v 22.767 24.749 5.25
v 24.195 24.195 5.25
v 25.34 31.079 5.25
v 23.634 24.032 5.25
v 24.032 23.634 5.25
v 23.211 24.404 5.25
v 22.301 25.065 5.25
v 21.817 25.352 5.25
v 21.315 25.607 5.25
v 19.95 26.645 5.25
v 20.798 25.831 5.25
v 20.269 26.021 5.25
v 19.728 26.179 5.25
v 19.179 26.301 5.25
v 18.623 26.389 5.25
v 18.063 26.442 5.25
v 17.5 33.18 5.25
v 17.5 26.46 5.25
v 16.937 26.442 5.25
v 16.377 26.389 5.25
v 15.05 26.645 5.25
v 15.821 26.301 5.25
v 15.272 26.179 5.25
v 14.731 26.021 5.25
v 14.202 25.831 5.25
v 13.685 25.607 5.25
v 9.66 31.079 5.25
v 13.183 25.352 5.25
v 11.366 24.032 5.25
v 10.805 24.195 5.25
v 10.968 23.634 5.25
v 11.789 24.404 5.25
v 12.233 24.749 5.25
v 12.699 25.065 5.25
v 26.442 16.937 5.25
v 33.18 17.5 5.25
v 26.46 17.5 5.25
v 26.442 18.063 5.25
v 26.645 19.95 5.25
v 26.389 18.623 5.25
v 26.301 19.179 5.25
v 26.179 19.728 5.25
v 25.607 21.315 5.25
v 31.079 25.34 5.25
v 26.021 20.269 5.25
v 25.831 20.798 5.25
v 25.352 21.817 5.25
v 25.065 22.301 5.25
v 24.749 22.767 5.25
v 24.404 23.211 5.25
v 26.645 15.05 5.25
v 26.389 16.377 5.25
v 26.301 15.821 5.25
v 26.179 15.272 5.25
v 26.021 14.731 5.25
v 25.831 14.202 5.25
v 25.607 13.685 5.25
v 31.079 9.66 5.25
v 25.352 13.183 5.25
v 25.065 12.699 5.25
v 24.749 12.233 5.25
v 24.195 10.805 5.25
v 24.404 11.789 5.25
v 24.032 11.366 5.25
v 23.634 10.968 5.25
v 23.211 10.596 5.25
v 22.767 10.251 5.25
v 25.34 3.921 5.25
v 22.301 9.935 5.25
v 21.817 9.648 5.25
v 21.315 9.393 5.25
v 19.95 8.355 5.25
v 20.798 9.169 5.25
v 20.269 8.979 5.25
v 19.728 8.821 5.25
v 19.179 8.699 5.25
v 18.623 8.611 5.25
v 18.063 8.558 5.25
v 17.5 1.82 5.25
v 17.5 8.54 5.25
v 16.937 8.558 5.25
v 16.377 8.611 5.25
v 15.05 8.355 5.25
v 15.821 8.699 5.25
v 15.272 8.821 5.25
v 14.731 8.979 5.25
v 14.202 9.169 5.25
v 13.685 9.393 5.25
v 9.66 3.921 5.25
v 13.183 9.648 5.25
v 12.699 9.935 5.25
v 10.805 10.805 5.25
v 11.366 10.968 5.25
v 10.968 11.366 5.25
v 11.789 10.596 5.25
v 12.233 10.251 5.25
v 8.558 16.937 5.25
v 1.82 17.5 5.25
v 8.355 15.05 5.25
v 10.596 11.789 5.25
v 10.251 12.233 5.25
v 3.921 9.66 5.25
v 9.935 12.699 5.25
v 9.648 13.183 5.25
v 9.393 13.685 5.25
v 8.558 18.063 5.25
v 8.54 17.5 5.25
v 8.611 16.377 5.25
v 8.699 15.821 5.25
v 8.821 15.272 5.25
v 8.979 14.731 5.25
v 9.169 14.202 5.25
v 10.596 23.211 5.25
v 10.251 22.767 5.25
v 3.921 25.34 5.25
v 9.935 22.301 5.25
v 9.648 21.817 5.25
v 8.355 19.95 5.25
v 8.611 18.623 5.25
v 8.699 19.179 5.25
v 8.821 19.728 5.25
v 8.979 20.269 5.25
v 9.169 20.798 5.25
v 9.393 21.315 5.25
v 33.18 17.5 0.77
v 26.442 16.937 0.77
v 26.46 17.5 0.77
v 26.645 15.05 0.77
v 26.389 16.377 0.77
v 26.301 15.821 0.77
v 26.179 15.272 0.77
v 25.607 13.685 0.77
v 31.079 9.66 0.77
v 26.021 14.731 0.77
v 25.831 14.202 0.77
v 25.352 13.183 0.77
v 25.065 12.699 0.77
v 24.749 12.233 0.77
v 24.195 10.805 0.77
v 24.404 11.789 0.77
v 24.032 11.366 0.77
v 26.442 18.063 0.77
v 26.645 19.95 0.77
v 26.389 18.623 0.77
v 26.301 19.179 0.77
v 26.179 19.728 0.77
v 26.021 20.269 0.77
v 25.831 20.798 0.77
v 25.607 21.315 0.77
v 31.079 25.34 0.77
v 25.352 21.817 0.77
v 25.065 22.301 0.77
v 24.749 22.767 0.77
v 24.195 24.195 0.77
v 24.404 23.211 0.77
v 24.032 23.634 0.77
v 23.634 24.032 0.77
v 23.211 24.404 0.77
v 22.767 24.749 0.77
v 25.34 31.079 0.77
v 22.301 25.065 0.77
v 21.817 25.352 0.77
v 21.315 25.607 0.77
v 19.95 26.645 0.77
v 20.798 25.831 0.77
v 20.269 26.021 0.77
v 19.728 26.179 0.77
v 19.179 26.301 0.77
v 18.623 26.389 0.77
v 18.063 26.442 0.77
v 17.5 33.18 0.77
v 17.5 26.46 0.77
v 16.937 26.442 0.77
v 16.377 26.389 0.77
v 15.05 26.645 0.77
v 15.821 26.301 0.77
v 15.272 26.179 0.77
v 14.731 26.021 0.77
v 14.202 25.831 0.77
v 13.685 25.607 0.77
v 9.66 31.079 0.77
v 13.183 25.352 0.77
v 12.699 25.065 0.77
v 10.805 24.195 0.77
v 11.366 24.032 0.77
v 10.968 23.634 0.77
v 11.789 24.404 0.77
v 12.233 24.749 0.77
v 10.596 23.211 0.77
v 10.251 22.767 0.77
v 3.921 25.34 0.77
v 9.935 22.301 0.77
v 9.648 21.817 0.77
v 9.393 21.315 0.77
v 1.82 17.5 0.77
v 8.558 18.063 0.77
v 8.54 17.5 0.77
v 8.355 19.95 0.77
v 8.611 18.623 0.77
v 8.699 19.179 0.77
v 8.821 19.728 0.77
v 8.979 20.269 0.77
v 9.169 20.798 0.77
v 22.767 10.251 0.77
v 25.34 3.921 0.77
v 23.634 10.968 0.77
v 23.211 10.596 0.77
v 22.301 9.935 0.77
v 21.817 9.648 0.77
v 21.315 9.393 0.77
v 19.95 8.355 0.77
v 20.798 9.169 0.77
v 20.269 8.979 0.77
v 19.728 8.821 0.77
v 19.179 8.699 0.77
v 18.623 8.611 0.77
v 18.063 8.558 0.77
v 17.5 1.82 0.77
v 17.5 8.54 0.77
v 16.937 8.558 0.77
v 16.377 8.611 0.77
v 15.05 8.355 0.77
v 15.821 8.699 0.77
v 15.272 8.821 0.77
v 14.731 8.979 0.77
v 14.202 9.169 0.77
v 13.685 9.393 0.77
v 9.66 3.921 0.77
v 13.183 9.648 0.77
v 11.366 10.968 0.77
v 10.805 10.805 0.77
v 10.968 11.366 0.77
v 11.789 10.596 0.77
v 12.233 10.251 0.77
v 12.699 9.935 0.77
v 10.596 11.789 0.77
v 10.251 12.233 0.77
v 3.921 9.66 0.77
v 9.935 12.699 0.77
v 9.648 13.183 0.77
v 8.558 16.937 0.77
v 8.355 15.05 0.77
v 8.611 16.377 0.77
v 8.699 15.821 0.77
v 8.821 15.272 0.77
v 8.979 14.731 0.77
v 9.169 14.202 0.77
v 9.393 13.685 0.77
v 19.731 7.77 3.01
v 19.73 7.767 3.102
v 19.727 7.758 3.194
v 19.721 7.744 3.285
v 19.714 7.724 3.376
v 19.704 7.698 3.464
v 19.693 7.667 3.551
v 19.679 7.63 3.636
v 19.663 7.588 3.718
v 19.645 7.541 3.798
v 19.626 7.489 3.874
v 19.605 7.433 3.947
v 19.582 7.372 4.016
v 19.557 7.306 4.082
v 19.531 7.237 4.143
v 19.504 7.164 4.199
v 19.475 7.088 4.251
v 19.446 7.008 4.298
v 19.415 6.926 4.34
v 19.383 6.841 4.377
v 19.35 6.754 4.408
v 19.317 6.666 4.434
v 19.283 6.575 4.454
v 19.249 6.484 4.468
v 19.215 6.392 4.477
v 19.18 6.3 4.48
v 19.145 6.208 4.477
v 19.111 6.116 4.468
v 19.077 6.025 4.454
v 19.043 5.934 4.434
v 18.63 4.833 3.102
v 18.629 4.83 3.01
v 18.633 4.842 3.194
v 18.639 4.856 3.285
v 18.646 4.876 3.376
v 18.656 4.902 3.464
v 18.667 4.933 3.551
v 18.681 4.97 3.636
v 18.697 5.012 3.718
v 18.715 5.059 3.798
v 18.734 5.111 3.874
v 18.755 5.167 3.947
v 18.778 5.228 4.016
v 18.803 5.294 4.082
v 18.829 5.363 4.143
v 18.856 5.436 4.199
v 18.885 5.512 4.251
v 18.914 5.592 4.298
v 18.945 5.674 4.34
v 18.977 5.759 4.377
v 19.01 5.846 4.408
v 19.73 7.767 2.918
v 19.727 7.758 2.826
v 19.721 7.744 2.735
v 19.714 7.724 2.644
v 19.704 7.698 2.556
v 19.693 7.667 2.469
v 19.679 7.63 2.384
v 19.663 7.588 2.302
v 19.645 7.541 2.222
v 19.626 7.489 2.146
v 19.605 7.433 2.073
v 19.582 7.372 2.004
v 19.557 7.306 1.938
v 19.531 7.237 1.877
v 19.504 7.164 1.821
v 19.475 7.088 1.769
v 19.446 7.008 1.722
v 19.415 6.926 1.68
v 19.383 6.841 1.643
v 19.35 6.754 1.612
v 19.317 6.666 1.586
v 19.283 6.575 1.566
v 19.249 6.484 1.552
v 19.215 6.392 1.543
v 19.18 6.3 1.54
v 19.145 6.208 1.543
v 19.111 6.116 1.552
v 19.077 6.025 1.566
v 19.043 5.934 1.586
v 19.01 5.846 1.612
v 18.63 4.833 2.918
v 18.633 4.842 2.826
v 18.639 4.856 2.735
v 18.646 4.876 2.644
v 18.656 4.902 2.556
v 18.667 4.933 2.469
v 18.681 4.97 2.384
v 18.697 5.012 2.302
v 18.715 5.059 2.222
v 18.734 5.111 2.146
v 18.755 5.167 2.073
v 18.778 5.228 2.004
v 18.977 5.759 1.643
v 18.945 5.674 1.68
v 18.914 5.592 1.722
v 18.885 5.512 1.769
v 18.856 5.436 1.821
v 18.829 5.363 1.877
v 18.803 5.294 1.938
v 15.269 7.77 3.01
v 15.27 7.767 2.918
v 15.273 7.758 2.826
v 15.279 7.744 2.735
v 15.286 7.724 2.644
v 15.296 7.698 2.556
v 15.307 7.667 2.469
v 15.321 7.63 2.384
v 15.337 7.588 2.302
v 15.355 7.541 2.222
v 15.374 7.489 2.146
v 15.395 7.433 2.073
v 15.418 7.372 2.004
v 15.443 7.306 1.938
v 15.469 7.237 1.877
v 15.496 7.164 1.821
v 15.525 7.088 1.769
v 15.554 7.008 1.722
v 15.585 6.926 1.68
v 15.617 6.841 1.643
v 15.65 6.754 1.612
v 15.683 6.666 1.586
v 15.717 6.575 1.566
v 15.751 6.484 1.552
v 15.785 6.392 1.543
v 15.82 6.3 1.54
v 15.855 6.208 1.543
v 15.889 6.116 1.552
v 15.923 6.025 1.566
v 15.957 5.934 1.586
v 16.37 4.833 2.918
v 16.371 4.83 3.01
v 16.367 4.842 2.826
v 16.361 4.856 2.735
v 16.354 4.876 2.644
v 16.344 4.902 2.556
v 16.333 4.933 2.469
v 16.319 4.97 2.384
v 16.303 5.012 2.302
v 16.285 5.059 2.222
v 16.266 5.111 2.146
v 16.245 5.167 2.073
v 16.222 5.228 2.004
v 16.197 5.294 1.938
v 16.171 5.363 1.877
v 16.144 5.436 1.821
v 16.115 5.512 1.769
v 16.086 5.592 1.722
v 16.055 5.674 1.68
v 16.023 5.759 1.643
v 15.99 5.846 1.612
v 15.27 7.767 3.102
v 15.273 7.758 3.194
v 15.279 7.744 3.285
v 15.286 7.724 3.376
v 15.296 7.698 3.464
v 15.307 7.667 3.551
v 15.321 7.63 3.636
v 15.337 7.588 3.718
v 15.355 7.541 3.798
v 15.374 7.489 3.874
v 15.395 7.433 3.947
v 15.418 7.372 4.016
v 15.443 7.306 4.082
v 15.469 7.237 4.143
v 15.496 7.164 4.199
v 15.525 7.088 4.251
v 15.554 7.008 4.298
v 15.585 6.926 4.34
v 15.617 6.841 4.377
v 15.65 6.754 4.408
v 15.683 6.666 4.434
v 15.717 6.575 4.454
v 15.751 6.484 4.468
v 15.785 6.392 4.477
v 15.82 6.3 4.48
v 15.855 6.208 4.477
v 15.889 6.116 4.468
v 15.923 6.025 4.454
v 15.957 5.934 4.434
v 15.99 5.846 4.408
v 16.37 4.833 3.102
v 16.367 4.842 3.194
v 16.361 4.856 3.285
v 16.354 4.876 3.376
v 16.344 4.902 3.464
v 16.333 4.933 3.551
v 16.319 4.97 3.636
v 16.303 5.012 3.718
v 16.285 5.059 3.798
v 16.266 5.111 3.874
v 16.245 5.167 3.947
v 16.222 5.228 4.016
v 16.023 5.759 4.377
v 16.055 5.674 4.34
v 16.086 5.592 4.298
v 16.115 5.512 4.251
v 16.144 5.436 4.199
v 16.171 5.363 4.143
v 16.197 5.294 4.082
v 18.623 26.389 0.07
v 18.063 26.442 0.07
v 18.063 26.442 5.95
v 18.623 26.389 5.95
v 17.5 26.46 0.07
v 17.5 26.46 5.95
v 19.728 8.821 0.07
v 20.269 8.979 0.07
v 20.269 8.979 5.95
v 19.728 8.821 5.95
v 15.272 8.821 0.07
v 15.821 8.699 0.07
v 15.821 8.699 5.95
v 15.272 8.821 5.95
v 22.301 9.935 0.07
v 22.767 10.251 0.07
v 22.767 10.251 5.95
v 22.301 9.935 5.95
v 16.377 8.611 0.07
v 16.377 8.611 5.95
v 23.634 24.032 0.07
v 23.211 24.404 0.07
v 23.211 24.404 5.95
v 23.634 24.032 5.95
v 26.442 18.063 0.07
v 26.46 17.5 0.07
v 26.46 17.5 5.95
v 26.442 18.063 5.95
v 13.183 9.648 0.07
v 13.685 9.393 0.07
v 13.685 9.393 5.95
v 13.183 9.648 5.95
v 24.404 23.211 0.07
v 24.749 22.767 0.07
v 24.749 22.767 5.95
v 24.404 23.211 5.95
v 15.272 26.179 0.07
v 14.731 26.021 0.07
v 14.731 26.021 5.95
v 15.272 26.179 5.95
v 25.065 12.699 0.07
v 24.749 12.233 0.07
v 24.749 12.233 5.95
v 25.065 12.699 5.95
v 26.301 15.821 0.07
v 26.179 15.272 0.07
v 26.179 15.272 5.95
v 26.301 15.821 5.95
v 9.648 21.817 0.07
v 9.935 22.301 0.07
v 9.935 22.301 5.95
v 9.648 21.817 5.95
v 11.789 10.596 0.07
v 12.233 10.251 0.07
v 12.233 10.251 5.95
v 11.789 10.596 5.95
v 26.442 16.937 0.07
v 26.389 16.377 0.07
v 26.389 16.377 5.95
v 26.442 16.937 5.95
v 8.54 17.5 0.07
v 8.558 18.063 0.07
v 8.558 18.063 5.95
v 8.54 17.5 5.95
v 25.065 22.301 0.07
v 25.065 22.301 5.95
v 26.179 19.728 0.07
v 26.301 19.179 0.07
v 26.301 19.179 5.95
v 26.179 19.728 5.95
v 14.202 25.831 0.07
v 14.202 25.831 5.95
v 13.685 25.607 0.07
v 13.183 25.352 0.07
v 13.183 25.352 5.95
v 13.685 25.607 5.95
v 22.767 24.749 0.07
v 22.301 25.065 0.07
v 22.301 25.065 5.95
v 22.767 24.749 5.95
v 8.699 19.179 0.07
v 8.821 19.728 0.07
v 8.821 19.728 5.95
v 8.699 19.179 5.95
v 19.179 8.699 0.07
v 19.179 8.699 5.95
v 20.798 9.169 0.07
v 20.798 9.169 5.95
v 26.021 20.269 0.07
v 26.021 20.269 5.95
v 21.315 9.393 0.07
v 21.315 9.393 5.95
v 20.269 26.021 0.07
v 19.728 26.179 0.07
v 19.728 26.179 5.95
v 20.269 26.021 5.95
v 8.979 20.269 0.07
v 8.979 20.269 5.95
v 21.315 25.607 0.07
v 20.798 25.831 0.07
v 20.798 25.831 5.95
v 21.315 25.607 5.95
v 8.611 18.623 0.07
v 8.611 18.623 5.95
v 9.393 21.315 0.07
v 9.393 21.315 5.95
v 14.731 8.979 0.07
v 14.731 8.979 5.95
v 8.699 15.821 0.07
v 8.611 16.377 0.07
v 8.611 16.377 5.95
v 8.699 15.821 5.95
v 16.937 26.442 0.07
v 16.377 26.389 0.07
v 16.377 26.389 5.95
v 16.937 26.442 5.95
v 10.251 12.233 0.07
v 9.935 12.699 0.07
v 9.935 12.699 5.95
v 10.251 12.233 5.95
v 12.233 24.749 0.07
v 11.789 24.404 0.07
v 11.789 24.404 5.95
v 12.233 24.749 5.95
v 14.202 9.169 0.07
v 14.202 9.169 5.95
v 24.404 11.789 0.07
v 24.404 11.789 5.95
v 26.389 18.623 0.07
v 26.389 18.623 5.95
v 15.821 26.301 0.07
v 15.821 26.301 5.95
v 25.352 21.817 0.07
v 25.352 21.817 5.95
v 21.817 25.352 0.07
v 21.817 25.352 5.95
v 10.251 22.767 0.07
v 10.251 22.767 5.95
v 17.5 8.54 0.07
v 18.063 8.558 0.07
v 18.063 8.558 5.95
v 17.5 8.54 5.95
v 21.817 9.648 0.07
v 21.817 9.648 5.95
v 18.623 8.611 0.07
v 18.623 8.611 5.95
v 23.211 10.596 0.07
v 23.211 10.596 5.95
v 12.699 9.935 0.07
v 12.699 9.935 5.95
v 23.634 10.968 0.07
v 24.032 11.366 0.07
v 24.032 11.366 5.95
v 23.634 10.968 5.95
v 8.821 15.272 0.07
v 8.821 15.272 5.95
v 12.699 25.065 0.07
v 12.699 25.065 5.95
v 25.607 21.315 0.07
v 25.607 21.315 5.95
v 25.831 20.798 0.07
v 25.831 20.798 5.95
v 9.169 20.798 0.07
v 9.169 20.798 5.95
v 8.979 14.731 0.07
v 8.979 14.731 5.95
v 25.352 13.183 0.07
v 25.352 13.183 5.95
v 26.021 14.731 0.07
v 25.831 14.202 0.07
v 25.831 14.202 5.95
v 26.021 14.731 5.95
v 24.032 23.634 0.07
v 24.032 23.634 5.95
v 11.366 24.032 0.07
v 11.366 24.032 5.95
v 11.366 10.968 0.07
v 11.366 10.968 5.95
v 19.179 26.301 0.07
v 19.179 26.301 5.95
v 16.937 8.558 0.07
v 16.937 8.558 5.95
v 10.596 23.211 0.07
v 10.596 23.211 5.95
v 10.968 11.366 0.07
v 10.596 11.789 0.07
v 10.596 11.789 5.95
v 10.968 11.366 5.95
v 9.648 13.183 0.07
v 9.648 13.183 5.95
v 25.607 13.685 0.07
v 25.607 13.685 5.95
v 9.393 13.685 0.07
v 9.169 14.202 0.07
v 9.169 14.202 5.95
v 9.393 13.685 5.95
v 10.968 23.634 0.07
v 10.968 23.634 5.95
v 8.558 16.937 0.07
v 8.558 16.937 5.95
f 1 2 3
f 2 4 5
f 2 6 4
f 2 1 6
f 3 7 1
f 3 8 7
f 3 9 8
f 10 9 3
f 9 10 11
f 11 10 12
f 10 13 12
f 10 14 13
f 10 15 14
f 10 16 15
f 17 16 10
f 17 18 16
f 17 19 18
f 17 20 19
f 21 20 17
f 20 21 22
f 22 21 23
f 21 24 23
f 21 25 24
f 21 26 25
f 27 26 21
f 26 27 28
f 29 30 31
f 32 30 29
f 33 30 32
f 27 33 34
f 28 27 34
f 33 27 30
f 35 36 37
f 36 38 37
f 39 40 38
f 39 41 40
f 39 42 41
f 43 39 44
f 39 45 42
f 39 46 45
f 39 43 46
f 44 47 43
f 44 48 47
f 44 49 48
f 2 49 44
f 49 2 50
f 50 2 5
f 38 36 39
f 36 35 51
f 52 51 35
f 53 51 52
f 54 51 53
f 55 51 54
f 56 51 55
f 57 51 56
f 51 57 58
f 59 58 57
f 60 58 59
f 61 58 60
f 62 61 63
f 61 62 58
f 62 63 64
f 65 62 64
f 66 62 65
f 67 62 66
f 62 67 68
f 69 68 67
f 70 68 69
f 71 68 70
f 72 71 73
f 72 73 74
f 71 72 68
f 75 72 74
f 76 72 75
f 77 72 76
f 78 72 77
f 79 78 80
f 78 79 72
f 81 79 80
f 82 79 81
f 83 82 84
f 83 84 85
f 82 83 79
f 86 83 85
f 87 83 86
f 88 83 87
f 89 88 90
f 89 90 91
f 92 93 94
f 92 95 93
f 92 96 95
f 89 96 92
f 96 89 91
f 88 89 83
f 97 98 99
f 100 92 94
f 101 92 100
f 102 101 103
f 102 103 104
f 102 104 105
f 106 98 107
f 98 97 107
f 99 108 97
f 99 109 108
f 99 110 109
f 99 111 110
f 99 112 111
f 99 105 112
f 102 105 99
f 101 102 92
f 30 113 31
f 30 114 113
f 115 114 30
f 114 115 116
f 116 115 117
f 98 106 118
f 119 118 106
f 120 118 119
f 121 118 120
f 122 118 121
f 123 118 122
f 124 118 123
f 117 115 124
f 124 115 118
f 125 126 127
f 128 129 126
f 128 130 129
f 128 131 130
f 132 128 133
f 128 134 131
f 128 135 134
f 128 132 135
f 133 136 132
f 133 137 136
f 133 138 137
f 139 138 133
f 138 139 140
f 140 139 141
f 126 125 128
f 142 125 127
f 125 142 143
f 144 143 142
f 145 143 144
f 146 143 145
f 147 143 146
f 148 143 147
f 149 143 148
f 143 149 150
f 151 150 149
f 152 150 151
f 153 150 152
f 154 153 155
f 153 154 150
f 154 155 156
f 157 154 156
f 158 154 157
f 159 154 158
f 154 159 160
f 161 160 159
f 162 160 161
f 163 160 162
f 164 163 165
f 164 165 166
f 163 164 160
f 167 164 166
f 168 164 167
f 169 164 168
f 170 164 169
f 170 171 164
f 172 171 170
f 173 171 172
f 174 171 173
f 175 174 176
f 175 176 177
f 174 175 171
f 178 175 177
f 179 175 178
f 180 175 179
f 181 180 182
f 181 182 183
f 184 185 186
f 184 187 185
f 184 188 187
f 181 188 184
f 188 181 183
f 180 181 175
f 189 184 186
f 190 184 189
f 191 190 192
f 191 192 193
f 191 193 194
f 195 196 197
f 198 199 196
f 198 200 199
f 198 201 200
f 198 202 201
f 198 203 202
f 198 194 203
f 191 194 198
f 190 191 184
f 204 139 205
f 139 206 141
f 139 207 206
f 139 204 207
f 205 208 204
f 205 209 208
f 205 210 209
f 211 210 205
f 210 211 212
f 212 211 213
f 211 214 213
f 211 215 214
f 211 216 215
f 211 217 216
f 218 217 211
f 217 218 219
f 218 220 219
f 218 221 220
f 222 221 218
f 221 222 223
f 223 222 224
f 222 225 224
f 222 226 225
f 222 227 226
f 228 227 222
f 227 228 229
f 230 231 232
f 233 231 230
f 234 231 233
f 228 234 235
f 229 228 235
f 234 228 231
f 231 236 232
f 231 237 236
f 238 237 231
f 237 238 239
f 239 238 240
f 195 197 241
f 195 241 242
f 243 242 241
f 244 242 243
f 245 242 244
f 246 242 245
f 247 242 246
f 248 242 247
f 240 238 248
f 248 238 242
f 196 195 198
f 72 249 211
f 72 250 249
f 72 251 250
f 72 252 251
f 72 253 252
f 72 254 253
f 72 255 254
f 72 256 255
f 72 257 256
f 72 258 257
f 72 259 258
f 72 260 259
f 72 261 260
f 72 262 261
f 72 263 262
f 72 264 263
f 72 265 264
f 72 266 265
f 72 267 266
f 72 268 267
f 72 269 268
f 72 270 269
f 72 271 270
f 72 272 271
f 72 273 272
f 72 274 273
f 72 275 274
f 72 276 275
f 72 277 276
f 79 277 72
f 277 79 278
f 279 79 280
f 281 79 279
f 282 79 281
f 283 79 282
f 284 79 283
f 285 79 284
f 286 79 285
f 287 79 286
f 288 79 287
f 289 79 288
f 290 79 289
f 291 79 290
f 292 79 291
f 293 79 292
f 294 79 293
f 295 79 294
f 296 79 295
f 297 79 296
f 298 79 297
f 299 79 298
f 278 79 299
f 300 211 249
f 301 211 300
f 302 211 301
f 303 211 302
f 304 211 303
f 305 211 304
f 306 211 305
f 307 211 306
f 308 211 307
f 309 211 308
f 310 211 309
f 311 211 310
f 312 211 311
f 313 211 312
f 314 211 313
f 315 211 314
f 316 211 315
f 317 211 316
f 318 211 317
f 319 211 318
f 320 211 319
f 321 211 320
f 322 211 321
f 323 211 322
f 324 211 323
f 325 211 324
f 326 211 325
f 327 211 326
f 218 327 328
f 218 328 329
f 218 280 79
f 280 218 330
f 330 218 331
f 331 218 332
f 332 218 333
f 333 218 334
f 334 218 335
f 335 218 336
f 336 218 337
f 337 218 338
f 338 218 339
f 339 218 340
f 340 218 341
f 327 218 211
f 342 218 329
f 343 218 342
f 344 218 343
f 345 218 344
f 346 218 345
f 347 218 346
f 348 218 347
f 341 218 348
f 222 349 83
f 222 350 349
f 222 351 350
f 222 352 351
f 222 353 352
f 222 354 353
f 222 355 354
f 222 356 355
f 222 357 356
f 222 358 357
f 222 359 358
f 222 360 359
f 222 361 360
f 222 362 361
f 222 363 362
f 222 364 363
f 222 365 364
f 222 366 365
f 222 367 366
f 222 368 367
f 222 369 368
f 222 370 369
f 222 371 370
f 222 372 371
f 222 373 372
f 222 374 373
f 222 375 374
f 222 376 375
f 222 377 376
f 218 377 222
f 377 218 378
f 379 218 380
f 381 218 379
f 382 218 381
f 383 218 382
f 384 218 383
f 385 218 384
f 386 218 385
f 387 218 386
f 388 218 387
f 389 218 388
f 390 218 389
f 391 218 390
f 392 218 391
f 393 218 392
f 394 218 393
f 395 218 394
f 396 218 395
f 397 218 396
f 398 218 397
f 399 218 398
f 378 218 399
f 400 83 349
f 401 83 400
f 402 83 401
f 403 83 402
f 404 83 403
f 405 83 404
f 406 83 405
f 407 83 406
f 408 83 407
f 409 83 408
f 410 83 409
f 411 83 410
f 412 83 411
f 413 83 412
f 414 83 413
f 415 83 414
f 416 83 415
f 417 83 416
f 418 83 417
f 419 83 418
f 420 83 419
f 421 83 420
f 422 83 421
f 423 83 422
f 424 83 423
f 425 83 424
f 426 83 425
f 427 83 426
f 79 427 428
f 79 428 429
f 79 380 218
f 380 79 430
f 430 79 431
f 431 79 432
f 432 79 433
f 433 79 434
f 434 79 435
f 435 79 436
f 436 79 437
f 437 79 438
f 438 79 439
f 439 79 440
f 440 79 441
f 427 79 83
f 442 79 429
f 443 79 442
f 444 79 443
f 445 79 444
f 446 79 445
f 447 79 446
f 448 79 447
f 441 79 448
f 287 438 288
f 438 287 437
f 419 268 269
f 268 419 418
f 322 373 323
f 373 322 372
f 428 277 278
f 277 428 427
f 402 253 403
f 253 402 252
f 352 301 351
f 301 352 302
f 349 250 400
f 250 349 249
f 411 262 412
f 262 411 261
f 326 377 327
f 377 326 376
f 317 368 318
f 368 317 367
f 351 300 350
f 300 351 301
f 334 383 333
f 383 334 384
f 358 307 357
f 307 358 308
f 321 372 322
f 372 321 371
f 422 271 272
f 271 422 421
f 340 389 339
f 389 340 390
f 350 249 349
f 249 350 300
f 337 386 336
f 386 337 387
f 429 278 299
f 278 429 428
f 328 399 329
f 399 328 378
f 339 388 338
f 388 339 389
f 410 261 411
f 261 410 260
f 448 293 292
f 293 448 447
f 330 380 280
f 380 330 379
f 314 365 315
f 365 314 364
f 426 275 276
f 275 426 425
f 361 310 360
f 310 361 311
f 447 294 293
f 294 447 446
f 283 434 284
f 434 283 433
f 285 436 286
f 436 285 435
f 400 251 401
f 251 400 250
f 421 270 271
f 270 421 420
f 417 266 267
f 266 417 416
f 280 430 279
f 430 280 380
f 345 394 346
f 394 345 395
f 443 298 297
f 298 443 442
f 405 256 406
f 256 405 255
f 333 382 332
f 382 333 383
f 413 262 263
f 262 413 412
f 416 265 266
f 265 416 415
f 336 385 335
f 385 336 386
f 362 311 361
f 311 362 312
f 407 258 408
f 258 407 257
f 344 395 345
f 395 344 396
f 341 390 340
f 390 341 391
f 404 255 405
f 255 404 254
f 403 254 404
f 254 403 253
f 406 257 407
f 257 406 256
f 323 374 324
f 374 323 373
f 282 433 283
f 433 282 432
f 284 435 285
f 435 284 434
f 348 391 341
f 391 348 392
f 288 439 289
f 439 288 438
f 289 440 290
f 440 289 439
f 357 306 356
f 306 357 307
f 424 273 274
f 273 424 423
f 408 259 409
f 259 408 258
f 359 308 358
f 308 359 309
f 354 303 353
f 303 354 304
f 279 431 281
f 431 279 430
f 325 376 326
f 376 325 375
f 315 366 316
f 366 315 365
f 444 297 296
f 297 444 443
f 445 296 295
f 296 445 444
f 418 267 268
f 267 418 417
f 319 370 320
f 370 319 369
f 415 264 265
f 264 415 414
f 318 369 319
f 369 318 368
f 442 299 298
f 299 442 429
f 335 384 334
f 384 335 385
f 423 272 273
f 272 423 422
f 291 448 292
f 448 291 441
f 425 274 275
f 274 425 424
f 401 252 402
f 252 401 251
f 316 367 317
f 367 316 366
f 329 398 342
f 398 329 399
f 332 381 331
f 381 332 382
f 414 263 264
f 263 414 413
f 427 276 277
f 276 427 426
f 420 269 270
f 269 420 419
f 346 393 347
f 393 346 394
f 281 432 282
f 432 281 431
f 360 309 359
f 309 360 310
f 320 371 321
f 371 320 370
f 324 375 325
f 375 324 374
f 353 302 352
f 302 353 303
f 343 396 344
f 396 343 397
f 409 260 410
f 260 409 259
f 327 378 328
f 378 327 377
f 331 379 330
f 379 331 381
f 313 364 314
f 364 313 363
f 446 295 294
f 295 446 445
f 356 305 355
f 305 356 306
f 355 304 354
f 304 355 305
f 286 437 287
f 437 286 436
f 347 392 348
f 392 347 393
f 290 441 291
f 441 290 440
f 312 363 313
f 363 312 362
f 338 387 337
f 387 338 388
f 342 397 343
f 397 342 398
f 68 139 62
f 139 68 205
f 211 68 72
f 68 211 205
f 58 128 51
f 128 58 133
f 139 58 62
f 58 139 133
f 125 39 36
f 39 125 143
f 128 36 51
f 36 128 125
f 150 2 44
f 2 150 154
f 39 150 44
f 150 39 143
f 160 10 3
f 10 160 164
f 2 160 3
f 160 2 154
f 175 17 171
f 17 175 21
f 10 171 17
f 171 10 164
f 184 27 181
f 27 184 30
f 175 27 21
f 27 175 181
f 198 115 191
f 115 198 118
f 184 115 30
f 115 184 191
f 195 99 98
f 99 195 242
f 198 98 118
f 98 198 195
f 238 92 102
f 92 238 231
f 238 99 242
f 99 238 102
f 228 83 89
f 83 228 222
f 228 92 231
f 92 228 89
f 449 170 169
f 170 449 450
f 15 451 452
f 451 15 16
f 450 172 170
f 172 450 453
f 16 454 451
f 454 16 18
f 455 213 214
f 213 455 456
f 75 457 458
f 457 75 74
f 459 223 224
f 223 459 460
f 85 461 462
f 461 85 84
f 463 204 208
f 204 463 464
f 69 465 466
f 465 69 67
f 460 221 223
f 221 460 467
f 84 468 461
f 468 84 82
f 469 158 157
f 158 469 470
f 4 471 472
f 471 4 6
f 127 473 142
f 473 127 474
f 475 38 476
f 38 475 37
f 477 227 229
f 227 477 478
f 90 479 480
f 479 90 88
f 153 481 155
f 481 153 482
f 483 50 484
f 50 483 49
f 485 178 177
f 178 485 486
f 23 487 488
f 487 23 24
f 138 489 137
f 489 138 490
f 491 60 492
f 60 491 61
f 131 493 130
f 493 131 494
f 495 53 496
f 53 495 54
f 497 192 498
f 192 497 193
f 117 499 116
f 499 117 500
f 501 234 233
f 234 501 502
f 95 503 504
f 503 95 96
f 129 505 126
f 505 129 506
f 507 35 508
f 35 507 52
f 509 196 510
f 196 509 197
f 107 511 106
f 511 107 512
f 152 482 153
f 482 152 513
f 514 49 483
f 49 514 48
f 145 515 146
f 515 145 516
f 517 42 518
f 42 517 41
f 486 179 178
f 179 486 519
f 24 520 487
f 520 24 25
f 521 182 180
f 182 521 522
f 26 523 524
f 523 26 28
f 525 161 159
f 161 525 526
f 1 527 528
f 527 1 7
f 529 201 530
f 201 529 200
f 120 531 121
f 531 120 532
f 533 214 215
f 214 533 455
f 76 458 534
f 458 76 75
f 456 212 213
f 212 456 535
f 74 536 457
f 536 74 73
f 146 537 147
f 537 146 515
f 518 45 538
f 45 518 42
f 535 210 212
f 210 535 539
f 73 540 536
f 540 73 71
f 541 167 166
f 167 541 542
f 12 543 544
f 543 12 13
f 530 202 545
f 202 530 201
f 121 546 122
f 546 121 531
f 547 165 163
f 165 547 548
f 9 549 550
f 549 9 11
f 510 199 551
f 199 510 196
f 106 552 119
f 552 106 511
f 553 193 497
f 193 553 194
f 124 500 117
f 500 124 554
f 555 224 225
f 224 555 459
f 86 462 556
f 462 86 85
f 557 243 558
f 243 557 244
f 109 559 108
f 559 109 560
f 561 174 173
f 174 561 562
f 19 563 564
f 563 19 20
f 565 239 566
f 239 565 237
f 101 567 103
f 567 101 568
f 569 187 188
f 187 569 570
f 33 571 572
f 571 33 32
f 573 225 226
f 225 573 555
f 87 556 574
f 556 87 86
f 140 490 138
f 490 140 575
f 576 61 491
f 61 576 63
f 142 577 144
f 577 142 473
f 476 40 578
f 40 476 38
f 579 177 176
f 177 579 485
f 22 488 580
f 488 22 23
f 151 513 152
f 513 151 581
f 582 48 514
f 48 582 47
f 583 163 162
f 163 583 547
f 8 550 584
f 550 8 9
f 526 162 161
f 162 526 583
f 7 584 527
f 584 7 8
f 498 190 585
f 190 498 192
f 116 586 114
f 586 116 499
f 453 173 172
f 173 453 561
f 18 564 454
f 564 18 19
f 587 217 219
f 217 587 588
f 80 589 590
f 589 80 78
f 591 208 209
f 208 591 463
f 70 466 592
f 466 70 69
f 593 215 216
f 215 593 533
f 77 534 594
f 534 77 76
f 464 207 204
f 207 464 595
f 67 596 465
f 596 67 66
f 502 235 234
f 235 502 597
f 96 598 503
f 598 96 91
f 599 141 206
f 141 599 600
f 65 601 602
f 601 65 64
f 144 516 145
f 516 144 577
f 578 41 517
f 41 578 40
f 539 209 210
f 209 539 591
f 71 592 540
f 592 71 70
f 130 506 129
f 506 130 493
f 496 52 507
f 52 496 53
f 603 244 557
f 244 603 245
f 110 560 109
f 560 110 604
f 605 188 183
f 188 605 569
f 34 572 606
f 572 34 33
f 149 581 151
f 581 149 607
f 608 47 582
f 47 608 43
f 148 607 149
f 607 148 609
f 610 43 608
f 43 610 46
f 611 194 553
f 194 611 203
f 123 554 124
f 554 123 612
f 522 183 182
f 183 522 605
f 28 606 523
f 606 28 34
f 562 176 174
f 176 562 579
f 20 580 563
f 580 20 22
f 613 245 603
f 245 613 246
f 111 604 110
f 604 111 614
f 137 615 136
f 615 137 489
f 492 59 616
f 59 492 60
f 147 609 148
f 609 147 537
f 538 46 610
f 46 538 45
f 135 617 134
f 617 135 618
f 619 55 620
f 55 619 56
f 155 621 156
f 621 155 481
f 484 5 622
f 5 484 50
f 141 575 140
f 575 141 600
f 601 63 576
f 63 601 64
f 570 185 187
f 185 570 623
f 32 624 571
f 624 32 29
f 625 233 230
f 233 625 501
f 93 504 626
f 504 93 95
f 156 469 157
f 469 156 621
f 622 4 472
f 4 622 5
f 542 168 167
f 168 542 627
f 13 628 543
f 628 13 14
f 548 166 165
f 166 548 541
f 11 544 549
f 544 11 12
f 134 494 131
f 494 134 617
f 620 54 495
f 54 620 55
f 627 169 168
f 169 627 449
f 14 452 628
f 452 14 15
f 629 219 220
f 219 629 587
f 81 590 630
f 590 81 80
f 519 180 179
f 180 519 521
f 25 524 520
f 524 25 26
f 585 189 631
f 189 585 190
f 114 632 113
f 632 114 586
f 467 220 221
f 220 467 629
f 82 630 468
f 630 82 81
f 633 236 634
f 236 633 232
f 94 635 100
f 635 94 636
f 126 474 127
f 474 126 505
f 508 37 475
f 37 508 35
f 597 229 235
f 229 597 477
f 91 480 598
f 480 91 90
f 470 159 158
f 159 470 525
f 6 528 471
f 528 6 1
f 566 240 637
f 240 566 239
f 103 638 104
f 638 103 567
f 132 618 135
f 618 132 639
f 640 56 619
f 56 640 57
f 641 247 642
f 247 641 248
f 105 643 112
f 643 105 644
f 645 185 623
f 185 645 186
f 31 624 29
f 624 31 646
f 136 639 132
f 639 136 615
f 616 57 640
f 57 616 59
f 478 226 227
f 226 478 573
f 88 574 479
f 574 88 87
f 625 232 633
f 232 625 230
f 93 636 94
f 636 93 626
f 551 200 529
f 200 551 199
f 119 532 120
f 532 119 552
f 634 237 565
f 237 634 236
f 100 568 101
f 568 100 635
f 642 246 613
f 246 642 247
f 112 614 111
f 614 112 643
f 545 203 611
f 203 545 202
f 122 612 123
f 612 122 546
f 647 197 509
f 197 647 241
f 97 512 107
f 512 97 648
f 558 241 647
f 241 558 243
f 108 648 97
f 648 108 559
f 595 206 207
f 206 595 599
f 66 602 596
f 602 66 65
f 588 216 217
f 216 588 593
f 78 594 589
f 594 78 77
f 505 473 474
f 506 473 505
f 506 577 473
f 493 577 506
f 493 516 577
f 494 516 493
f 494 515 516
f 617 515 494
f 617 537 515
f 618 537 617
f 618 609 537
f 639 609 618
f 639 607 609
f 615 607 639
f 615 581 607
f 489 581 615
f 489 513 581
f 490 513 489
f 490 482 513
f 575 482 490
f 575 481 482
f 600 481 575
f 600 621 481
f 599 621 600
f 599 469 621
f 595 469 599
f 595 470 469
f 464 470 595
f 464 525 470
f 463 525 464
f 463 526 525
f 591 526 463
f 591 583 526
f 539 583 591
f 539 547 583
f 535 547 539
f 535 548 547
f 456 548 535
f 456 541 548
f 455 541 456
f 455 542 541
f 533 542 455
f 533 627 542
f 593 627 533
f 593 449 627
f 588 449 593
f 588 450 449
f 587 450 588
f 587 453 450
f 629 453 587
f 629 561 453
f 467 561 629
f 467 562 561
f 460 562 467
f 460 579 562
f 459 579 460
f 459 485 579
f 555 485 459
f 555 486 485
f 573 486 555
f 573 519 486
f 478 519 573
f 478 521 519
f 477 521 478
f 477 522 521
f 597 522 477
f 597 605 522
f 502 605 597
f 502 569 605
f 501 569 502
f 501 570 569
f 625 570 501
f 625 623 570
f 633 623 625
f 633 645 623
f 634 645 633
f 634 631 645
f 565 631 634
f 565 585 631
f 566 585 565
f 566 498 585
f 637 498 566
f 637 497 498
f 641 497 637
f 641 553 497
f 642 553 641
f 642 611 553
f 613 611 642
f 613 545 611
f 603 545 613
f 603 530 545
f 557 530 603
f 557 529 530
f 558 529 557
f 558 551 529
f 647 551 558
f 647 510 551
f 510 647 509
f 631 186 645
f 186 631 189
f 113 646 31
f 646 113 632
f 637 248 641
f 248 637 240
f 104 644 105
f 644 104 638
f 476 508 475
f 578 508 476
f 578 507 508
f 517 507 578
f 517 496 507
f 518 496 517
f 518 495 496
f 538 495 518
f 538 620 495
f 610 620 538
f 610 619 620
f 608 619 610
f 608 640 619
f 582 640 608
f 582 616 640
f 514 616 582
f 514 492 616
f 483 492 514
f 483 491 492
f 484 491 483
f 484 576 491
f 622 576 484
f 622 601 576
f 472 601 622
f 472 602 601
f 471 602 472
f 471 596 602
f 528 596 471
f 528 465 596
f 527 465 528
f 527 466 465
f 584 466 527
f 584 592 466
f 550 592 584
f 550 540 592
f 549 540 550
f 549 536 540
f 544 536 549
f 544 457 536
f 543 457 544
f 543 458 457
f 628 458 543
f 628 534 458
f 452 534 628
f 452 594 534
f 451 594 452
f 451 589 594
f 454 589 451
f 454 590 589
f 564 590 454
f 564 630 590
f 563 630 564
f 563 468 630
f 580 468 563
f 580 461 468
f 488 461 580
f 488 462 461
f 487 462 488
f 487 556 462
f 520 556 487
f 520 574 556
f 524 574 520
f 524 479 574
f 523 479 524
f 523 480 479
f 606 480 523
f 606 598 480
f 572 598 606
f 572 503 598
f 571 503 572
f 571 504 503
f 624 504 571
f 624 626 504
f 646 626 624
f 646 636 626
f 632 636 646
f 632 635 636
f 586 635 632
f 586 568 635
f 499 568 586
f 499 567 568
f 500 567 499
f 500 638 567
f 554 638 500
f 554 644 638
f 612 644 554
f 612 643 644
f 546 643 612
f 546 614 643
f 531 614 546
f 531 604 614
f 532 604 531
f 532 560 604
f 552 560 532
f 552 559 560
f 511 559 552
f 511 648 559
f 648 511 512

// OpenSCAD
/*
Sun Pendant 
by Corrinne Casey
Note: this is meant to be put on a string and worn. Please scale appropriately.
*/
module sun(){
$fn= 100;
cyldiam = 25.6;
thickness = 6.4;
tri1 = [0,0];
tri2 = [4.8,12.8];
tri3 = [9.6,0];
holediam = 4.2;
holelength = 8;
holemove = [-3.8,-3.2,16];
trimove = [-4.8,9.6,0];
circout = 1;
xmovetotal = 25;
ymovetotal = 25;
zmovetotal = 7.5;

translate([25,25,7.5]){
rotate([90,0,0]){
rotate([90,0,0]){
cylinder(d = cyldiam, h = thickness);}
difference(){
    rotate([90,0,0]){
translate(trimove){linear_extrude(thickness){polygon([tri1,tri2,tri3]);}}}
translate(holemove){
rotate([0,90,0]){cylinder(d=holediam,h=holelength);}}}

for(i= [30:30:330]){
    rotate([90,i,0]){
translate(trimove){linear_extrude(thickness){polygon([tri1,tri2,tri3]);}}}}



rotate([90,-180,0]){
 translate([0,0,circout]){rotate([0,0,90]){
cylinder(d = cyldiam, h = thickness);}}
 translate([0,0,(circout*-1)]){rotate([0,0,90]){
     cylinder(d = cyldiam, h = thickness);}}}}}
 }
 scale([.7,.7,.7]){
     sun();}
